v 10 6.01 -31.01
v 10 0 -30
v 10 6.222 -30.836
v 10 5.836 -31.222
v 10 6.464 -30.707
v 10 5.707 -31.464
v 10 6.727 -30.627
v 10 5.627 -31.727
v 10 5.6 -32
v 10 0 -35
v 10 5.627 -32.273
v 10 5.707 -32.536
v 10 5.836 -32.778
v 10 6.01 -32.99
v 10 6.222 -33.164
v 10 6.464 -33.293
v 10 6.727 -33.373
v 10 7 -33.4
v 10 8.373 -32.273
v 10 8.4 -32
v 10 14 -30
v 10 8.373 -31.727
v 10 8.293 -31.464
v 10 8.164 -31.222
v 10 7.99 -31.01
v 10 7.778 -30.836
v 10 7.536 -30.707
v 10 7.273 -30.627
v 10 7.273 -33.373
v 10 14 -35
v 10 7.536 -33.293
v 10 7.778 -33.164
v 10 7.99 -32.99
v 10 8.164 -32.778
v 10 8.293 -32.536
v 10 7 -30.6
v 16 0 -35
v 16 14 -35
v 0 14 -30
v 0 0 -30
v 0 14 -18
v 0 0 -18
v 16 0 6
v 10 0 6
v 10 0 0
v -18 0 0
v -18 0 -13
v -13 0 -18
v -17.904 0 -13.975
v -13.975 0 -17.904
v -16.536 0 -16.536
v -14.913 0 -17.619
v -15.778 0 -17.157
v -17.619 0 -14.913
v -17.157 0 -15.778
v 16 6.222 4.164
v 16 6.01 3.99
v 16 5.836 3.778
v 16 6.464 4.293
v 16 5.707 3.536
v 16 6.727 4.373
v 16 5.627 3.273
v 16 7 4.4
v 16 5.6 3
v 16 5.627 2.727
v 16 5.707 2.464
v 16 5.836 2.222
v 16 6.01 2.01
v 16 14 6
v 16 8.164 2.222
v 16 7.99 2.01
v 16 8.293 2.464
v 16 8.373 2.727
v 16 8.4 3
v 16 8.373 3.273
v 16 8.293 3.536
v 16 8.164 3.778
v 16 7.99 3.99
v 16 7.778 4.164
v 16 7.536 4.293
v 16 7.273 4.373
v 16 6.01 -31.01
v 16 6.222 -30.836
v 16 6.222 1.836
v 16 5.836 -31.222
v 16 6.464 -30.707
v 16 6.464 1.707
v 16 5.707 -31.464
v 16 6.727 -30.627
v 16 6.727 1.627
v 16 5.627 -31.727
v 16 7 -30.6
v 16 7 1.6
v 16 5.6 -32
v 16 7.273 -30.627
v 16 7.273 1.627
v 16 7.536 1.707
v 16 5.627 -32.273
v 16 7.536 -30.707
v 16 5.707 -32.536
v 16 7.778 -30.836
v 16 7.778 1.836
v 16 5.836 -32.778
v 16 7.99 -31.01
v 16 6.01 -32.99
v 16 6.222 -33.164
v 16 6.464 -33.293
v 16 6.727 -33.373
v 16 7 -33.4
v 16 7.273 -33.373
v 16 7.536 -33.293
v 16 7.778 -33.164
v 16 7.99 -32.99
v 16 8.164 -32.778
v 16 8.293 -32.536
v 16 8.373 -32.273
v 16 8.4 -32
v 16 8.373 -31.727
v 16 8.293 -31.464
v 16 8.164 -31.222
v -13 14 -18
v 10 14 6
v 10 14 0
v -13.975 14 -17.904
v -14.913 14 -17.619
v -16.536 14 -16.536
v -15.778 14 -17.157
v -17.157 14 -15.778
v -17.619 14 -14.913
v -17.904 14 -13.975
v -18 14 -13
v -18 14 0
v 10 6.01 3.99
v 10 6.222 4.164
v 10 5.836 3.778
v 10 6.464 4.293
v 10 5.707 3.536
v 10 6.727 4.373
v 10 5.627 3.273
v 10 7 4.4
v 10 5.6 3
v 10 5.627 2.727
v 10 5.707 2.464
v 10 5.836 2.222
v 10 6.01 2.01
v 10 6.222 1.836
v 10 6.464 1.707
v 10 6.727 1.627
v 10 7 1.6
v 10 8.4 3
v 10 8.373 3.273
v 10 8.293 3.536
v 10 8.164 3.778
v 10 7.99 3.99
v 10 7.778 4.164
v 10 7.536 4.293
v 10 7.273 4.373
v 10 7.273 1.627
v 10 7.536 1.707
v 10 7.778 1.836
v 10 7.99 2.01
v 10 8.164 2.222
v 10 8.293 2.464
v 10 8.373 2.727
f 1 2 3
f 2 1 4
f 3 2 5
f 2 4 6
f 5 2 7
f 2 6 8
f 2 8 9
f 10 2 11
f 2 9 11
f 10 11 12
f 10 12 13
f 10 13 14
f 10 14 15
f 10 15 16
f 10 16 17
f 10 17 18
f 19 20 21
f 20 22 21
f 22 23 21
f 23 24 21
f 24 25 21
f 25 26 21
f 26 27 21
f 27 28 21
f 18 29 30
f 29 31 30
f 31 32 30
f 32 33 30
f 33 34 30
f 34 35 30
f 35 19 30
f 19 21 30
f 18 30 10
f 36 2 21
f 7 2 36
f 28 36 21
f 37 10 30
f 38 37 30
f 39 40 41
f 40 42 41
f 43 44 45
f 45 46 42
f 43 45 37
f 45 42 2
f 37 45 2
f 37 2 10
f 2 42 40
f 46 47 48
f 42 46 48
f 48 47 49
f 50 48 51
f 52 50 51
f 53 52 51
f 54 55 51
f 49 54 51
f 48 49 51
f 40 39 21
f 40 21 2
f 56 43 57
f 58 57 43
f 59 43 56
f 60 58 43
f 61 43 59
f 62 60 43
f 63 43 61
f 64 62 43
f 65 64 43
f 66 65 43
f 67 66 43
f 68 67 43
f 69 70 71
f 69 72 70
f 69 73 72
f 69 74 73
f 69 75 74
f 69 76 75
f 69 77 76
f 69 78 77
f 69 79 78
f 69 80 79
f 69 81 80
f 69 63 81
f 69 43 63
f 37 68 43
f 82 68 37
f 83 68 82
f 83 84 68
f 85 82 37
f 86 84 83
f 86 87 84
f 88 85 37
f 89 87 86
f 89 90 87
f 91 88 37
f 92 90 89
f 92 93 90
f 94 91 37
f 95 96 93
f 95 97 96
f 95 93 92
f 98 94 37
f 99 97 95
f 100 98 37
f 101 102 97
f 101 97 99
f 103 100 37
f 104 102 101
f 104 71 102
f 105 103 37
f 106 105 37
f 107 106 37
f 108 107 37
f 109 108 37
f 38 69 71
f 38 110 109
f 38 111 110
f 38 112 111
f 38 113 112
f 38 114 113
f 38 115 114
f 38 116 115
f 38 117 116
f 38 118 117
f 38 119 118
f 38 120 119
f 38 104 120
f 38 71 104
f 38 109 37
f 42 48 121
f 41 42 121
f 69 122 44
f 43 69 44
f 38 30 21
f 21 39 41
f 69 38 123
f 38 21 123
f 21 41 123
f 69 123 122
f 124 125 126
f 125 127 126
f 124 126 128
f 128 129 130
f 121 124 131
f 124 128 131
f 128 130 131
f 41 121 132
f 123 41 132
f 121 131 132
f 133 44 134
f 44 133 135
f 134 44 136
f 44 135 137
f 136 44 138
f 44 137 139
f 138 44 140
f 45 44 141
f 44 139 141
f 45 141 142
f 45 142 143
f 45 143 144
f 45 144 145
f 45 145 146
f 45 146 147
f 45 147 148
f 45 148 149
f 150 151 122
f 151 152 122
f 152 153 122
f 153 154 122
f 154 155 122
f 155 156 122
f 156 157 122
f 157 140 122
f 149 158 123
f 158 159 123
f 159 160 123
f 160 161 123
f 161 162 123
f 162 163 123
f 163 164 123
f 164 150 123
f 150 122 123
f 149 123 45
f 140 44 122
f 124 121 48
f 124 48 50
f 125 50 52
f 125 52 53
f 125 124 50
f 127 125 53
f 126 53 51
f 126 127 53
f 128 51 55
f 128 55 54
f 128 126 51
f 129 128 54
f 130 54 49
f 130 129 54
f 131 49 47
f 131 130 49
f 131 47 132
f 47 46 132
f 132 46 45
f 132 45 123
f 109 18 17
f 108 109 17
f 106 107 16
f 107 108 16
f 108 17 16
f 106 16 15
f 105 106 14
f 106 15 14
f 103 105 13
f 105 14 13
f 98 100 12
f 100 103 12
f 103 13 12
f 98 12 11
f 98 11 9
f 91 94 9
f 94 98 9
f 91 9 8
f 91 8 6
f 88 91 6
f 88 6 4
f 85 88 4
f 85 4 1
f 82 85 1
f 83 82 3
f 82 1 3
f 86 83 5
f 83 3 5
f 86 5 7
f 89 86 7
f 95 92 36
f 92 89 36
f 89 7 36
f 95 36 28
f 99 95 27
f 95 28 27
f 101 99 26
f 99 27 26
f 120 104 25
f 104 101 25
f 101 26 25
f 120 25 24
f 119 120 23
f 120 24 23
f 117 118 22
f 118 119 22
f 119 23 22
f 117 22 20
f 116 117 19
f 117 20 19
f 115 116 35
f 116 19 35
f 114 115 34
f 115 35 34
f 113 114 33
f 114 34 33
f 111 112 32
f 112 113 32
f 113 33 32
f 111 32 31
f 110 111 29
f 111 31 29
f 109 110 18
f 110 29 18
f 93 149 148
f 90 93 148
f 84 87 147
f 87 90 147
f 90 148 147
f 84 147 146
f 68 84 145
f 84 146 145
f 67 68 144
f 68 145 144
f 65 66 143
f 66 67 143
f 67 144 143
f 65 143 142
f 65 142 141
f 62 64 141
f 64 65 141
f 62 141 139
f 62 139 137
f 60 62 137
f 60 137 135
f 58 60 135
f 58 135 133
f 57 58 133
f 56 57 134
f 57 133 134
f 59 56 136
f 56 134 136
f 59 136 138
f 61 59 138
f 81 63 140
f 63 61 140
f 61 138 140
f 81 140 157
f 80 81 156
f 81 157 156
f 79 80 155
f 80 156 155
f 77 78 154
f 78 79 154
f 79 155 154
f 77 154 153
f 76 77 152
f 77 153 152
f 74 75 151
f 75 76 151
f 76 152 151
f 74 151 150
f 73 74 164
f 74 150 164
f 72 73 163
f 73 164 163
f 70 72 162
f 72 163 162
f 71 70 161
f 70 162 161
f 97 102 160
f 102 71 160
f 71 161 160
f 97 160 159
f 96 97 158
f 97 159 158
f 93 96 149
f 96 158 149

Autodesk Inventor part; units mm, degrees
ref_plane "YZ Plane" through (0, 0, 0) normal (1, 0, 0) x (0, 1, 0)
ref_plane "XZ Plane" through (0, 0, 0) normal (0, 1, 0) x (-1, 0, 0)
ref_plane "XY Plane" through (0, 0, 0) normal (0, 0, 1) x (1, 0, 0)
sketch "Sketch1" plane through (0, 0, 0) normal (1, 0, 0) x (0, 1, 0)
  line L0 (0, 0) -> (14, 0)
  line L1 (14, 0) -> (14, -30)
  line L2 (14, -30) -> (0, -30)
  line L3 (0, -30) -> (0, 0)
  line L4 (14, -30) -> (0, -30)
  line L5 (0, -30) -> (0, -30)
  line L6 (0, -30) -> (14, -30)
  line L7 (14, -30) -> (14, -30)
  line L8 (0, 0) -> (0, -18)
  line L9 (0, -18) -> (14, -18)
  line L10 (14, -18) -> (14, 0)
  point P0 (14, -18)
  dimension "d12" = 14
  dimension "d13" = 30
  dimension "d14" = 12
  dimension "d15" = 0
extrude "Extrusion6" add sketch "Sketch1" along normal blind 10 contours L9 L1 L2 L3
extrude "Extrusion7" add sketch "Sketch1" along normal blind 10 and the other way blind 18 contours L0 L1 L9 L3
fillet "Fillet2" radius 5 1 edges at (-18, 7, -18)
sketch "Sketch7" plane through (10, 0, 0) normal (1, 0, 0) x (0, 0, -1)
  line L0 (35, 14) -> (-6, 14)
  line L1 (-6, 14) -> (-6, 0)
  line L2 (-6, 0) -> (35, 0)
  line L3 (35, 0) -> (35, 14)
  line L4 (30, 0) -> (30, 14) projected
  circle A0 centre (32, 7) radius 1.4
  circle A1 centre (-3, 7) radius 1.4
  point P0 (0, 0)
  dimension "d32" = 41
  dimension "d33" = 5
  dimension "d34" = 14
  dimension "d35" = 2.8
  dimension "d36" = 3
  dimension "d37" = 2.8
  dimension "d38" = 35
extrude "Extrusion9" add sketch "Sketch7" along normal blind 6
properties part number "_3DPrint"
